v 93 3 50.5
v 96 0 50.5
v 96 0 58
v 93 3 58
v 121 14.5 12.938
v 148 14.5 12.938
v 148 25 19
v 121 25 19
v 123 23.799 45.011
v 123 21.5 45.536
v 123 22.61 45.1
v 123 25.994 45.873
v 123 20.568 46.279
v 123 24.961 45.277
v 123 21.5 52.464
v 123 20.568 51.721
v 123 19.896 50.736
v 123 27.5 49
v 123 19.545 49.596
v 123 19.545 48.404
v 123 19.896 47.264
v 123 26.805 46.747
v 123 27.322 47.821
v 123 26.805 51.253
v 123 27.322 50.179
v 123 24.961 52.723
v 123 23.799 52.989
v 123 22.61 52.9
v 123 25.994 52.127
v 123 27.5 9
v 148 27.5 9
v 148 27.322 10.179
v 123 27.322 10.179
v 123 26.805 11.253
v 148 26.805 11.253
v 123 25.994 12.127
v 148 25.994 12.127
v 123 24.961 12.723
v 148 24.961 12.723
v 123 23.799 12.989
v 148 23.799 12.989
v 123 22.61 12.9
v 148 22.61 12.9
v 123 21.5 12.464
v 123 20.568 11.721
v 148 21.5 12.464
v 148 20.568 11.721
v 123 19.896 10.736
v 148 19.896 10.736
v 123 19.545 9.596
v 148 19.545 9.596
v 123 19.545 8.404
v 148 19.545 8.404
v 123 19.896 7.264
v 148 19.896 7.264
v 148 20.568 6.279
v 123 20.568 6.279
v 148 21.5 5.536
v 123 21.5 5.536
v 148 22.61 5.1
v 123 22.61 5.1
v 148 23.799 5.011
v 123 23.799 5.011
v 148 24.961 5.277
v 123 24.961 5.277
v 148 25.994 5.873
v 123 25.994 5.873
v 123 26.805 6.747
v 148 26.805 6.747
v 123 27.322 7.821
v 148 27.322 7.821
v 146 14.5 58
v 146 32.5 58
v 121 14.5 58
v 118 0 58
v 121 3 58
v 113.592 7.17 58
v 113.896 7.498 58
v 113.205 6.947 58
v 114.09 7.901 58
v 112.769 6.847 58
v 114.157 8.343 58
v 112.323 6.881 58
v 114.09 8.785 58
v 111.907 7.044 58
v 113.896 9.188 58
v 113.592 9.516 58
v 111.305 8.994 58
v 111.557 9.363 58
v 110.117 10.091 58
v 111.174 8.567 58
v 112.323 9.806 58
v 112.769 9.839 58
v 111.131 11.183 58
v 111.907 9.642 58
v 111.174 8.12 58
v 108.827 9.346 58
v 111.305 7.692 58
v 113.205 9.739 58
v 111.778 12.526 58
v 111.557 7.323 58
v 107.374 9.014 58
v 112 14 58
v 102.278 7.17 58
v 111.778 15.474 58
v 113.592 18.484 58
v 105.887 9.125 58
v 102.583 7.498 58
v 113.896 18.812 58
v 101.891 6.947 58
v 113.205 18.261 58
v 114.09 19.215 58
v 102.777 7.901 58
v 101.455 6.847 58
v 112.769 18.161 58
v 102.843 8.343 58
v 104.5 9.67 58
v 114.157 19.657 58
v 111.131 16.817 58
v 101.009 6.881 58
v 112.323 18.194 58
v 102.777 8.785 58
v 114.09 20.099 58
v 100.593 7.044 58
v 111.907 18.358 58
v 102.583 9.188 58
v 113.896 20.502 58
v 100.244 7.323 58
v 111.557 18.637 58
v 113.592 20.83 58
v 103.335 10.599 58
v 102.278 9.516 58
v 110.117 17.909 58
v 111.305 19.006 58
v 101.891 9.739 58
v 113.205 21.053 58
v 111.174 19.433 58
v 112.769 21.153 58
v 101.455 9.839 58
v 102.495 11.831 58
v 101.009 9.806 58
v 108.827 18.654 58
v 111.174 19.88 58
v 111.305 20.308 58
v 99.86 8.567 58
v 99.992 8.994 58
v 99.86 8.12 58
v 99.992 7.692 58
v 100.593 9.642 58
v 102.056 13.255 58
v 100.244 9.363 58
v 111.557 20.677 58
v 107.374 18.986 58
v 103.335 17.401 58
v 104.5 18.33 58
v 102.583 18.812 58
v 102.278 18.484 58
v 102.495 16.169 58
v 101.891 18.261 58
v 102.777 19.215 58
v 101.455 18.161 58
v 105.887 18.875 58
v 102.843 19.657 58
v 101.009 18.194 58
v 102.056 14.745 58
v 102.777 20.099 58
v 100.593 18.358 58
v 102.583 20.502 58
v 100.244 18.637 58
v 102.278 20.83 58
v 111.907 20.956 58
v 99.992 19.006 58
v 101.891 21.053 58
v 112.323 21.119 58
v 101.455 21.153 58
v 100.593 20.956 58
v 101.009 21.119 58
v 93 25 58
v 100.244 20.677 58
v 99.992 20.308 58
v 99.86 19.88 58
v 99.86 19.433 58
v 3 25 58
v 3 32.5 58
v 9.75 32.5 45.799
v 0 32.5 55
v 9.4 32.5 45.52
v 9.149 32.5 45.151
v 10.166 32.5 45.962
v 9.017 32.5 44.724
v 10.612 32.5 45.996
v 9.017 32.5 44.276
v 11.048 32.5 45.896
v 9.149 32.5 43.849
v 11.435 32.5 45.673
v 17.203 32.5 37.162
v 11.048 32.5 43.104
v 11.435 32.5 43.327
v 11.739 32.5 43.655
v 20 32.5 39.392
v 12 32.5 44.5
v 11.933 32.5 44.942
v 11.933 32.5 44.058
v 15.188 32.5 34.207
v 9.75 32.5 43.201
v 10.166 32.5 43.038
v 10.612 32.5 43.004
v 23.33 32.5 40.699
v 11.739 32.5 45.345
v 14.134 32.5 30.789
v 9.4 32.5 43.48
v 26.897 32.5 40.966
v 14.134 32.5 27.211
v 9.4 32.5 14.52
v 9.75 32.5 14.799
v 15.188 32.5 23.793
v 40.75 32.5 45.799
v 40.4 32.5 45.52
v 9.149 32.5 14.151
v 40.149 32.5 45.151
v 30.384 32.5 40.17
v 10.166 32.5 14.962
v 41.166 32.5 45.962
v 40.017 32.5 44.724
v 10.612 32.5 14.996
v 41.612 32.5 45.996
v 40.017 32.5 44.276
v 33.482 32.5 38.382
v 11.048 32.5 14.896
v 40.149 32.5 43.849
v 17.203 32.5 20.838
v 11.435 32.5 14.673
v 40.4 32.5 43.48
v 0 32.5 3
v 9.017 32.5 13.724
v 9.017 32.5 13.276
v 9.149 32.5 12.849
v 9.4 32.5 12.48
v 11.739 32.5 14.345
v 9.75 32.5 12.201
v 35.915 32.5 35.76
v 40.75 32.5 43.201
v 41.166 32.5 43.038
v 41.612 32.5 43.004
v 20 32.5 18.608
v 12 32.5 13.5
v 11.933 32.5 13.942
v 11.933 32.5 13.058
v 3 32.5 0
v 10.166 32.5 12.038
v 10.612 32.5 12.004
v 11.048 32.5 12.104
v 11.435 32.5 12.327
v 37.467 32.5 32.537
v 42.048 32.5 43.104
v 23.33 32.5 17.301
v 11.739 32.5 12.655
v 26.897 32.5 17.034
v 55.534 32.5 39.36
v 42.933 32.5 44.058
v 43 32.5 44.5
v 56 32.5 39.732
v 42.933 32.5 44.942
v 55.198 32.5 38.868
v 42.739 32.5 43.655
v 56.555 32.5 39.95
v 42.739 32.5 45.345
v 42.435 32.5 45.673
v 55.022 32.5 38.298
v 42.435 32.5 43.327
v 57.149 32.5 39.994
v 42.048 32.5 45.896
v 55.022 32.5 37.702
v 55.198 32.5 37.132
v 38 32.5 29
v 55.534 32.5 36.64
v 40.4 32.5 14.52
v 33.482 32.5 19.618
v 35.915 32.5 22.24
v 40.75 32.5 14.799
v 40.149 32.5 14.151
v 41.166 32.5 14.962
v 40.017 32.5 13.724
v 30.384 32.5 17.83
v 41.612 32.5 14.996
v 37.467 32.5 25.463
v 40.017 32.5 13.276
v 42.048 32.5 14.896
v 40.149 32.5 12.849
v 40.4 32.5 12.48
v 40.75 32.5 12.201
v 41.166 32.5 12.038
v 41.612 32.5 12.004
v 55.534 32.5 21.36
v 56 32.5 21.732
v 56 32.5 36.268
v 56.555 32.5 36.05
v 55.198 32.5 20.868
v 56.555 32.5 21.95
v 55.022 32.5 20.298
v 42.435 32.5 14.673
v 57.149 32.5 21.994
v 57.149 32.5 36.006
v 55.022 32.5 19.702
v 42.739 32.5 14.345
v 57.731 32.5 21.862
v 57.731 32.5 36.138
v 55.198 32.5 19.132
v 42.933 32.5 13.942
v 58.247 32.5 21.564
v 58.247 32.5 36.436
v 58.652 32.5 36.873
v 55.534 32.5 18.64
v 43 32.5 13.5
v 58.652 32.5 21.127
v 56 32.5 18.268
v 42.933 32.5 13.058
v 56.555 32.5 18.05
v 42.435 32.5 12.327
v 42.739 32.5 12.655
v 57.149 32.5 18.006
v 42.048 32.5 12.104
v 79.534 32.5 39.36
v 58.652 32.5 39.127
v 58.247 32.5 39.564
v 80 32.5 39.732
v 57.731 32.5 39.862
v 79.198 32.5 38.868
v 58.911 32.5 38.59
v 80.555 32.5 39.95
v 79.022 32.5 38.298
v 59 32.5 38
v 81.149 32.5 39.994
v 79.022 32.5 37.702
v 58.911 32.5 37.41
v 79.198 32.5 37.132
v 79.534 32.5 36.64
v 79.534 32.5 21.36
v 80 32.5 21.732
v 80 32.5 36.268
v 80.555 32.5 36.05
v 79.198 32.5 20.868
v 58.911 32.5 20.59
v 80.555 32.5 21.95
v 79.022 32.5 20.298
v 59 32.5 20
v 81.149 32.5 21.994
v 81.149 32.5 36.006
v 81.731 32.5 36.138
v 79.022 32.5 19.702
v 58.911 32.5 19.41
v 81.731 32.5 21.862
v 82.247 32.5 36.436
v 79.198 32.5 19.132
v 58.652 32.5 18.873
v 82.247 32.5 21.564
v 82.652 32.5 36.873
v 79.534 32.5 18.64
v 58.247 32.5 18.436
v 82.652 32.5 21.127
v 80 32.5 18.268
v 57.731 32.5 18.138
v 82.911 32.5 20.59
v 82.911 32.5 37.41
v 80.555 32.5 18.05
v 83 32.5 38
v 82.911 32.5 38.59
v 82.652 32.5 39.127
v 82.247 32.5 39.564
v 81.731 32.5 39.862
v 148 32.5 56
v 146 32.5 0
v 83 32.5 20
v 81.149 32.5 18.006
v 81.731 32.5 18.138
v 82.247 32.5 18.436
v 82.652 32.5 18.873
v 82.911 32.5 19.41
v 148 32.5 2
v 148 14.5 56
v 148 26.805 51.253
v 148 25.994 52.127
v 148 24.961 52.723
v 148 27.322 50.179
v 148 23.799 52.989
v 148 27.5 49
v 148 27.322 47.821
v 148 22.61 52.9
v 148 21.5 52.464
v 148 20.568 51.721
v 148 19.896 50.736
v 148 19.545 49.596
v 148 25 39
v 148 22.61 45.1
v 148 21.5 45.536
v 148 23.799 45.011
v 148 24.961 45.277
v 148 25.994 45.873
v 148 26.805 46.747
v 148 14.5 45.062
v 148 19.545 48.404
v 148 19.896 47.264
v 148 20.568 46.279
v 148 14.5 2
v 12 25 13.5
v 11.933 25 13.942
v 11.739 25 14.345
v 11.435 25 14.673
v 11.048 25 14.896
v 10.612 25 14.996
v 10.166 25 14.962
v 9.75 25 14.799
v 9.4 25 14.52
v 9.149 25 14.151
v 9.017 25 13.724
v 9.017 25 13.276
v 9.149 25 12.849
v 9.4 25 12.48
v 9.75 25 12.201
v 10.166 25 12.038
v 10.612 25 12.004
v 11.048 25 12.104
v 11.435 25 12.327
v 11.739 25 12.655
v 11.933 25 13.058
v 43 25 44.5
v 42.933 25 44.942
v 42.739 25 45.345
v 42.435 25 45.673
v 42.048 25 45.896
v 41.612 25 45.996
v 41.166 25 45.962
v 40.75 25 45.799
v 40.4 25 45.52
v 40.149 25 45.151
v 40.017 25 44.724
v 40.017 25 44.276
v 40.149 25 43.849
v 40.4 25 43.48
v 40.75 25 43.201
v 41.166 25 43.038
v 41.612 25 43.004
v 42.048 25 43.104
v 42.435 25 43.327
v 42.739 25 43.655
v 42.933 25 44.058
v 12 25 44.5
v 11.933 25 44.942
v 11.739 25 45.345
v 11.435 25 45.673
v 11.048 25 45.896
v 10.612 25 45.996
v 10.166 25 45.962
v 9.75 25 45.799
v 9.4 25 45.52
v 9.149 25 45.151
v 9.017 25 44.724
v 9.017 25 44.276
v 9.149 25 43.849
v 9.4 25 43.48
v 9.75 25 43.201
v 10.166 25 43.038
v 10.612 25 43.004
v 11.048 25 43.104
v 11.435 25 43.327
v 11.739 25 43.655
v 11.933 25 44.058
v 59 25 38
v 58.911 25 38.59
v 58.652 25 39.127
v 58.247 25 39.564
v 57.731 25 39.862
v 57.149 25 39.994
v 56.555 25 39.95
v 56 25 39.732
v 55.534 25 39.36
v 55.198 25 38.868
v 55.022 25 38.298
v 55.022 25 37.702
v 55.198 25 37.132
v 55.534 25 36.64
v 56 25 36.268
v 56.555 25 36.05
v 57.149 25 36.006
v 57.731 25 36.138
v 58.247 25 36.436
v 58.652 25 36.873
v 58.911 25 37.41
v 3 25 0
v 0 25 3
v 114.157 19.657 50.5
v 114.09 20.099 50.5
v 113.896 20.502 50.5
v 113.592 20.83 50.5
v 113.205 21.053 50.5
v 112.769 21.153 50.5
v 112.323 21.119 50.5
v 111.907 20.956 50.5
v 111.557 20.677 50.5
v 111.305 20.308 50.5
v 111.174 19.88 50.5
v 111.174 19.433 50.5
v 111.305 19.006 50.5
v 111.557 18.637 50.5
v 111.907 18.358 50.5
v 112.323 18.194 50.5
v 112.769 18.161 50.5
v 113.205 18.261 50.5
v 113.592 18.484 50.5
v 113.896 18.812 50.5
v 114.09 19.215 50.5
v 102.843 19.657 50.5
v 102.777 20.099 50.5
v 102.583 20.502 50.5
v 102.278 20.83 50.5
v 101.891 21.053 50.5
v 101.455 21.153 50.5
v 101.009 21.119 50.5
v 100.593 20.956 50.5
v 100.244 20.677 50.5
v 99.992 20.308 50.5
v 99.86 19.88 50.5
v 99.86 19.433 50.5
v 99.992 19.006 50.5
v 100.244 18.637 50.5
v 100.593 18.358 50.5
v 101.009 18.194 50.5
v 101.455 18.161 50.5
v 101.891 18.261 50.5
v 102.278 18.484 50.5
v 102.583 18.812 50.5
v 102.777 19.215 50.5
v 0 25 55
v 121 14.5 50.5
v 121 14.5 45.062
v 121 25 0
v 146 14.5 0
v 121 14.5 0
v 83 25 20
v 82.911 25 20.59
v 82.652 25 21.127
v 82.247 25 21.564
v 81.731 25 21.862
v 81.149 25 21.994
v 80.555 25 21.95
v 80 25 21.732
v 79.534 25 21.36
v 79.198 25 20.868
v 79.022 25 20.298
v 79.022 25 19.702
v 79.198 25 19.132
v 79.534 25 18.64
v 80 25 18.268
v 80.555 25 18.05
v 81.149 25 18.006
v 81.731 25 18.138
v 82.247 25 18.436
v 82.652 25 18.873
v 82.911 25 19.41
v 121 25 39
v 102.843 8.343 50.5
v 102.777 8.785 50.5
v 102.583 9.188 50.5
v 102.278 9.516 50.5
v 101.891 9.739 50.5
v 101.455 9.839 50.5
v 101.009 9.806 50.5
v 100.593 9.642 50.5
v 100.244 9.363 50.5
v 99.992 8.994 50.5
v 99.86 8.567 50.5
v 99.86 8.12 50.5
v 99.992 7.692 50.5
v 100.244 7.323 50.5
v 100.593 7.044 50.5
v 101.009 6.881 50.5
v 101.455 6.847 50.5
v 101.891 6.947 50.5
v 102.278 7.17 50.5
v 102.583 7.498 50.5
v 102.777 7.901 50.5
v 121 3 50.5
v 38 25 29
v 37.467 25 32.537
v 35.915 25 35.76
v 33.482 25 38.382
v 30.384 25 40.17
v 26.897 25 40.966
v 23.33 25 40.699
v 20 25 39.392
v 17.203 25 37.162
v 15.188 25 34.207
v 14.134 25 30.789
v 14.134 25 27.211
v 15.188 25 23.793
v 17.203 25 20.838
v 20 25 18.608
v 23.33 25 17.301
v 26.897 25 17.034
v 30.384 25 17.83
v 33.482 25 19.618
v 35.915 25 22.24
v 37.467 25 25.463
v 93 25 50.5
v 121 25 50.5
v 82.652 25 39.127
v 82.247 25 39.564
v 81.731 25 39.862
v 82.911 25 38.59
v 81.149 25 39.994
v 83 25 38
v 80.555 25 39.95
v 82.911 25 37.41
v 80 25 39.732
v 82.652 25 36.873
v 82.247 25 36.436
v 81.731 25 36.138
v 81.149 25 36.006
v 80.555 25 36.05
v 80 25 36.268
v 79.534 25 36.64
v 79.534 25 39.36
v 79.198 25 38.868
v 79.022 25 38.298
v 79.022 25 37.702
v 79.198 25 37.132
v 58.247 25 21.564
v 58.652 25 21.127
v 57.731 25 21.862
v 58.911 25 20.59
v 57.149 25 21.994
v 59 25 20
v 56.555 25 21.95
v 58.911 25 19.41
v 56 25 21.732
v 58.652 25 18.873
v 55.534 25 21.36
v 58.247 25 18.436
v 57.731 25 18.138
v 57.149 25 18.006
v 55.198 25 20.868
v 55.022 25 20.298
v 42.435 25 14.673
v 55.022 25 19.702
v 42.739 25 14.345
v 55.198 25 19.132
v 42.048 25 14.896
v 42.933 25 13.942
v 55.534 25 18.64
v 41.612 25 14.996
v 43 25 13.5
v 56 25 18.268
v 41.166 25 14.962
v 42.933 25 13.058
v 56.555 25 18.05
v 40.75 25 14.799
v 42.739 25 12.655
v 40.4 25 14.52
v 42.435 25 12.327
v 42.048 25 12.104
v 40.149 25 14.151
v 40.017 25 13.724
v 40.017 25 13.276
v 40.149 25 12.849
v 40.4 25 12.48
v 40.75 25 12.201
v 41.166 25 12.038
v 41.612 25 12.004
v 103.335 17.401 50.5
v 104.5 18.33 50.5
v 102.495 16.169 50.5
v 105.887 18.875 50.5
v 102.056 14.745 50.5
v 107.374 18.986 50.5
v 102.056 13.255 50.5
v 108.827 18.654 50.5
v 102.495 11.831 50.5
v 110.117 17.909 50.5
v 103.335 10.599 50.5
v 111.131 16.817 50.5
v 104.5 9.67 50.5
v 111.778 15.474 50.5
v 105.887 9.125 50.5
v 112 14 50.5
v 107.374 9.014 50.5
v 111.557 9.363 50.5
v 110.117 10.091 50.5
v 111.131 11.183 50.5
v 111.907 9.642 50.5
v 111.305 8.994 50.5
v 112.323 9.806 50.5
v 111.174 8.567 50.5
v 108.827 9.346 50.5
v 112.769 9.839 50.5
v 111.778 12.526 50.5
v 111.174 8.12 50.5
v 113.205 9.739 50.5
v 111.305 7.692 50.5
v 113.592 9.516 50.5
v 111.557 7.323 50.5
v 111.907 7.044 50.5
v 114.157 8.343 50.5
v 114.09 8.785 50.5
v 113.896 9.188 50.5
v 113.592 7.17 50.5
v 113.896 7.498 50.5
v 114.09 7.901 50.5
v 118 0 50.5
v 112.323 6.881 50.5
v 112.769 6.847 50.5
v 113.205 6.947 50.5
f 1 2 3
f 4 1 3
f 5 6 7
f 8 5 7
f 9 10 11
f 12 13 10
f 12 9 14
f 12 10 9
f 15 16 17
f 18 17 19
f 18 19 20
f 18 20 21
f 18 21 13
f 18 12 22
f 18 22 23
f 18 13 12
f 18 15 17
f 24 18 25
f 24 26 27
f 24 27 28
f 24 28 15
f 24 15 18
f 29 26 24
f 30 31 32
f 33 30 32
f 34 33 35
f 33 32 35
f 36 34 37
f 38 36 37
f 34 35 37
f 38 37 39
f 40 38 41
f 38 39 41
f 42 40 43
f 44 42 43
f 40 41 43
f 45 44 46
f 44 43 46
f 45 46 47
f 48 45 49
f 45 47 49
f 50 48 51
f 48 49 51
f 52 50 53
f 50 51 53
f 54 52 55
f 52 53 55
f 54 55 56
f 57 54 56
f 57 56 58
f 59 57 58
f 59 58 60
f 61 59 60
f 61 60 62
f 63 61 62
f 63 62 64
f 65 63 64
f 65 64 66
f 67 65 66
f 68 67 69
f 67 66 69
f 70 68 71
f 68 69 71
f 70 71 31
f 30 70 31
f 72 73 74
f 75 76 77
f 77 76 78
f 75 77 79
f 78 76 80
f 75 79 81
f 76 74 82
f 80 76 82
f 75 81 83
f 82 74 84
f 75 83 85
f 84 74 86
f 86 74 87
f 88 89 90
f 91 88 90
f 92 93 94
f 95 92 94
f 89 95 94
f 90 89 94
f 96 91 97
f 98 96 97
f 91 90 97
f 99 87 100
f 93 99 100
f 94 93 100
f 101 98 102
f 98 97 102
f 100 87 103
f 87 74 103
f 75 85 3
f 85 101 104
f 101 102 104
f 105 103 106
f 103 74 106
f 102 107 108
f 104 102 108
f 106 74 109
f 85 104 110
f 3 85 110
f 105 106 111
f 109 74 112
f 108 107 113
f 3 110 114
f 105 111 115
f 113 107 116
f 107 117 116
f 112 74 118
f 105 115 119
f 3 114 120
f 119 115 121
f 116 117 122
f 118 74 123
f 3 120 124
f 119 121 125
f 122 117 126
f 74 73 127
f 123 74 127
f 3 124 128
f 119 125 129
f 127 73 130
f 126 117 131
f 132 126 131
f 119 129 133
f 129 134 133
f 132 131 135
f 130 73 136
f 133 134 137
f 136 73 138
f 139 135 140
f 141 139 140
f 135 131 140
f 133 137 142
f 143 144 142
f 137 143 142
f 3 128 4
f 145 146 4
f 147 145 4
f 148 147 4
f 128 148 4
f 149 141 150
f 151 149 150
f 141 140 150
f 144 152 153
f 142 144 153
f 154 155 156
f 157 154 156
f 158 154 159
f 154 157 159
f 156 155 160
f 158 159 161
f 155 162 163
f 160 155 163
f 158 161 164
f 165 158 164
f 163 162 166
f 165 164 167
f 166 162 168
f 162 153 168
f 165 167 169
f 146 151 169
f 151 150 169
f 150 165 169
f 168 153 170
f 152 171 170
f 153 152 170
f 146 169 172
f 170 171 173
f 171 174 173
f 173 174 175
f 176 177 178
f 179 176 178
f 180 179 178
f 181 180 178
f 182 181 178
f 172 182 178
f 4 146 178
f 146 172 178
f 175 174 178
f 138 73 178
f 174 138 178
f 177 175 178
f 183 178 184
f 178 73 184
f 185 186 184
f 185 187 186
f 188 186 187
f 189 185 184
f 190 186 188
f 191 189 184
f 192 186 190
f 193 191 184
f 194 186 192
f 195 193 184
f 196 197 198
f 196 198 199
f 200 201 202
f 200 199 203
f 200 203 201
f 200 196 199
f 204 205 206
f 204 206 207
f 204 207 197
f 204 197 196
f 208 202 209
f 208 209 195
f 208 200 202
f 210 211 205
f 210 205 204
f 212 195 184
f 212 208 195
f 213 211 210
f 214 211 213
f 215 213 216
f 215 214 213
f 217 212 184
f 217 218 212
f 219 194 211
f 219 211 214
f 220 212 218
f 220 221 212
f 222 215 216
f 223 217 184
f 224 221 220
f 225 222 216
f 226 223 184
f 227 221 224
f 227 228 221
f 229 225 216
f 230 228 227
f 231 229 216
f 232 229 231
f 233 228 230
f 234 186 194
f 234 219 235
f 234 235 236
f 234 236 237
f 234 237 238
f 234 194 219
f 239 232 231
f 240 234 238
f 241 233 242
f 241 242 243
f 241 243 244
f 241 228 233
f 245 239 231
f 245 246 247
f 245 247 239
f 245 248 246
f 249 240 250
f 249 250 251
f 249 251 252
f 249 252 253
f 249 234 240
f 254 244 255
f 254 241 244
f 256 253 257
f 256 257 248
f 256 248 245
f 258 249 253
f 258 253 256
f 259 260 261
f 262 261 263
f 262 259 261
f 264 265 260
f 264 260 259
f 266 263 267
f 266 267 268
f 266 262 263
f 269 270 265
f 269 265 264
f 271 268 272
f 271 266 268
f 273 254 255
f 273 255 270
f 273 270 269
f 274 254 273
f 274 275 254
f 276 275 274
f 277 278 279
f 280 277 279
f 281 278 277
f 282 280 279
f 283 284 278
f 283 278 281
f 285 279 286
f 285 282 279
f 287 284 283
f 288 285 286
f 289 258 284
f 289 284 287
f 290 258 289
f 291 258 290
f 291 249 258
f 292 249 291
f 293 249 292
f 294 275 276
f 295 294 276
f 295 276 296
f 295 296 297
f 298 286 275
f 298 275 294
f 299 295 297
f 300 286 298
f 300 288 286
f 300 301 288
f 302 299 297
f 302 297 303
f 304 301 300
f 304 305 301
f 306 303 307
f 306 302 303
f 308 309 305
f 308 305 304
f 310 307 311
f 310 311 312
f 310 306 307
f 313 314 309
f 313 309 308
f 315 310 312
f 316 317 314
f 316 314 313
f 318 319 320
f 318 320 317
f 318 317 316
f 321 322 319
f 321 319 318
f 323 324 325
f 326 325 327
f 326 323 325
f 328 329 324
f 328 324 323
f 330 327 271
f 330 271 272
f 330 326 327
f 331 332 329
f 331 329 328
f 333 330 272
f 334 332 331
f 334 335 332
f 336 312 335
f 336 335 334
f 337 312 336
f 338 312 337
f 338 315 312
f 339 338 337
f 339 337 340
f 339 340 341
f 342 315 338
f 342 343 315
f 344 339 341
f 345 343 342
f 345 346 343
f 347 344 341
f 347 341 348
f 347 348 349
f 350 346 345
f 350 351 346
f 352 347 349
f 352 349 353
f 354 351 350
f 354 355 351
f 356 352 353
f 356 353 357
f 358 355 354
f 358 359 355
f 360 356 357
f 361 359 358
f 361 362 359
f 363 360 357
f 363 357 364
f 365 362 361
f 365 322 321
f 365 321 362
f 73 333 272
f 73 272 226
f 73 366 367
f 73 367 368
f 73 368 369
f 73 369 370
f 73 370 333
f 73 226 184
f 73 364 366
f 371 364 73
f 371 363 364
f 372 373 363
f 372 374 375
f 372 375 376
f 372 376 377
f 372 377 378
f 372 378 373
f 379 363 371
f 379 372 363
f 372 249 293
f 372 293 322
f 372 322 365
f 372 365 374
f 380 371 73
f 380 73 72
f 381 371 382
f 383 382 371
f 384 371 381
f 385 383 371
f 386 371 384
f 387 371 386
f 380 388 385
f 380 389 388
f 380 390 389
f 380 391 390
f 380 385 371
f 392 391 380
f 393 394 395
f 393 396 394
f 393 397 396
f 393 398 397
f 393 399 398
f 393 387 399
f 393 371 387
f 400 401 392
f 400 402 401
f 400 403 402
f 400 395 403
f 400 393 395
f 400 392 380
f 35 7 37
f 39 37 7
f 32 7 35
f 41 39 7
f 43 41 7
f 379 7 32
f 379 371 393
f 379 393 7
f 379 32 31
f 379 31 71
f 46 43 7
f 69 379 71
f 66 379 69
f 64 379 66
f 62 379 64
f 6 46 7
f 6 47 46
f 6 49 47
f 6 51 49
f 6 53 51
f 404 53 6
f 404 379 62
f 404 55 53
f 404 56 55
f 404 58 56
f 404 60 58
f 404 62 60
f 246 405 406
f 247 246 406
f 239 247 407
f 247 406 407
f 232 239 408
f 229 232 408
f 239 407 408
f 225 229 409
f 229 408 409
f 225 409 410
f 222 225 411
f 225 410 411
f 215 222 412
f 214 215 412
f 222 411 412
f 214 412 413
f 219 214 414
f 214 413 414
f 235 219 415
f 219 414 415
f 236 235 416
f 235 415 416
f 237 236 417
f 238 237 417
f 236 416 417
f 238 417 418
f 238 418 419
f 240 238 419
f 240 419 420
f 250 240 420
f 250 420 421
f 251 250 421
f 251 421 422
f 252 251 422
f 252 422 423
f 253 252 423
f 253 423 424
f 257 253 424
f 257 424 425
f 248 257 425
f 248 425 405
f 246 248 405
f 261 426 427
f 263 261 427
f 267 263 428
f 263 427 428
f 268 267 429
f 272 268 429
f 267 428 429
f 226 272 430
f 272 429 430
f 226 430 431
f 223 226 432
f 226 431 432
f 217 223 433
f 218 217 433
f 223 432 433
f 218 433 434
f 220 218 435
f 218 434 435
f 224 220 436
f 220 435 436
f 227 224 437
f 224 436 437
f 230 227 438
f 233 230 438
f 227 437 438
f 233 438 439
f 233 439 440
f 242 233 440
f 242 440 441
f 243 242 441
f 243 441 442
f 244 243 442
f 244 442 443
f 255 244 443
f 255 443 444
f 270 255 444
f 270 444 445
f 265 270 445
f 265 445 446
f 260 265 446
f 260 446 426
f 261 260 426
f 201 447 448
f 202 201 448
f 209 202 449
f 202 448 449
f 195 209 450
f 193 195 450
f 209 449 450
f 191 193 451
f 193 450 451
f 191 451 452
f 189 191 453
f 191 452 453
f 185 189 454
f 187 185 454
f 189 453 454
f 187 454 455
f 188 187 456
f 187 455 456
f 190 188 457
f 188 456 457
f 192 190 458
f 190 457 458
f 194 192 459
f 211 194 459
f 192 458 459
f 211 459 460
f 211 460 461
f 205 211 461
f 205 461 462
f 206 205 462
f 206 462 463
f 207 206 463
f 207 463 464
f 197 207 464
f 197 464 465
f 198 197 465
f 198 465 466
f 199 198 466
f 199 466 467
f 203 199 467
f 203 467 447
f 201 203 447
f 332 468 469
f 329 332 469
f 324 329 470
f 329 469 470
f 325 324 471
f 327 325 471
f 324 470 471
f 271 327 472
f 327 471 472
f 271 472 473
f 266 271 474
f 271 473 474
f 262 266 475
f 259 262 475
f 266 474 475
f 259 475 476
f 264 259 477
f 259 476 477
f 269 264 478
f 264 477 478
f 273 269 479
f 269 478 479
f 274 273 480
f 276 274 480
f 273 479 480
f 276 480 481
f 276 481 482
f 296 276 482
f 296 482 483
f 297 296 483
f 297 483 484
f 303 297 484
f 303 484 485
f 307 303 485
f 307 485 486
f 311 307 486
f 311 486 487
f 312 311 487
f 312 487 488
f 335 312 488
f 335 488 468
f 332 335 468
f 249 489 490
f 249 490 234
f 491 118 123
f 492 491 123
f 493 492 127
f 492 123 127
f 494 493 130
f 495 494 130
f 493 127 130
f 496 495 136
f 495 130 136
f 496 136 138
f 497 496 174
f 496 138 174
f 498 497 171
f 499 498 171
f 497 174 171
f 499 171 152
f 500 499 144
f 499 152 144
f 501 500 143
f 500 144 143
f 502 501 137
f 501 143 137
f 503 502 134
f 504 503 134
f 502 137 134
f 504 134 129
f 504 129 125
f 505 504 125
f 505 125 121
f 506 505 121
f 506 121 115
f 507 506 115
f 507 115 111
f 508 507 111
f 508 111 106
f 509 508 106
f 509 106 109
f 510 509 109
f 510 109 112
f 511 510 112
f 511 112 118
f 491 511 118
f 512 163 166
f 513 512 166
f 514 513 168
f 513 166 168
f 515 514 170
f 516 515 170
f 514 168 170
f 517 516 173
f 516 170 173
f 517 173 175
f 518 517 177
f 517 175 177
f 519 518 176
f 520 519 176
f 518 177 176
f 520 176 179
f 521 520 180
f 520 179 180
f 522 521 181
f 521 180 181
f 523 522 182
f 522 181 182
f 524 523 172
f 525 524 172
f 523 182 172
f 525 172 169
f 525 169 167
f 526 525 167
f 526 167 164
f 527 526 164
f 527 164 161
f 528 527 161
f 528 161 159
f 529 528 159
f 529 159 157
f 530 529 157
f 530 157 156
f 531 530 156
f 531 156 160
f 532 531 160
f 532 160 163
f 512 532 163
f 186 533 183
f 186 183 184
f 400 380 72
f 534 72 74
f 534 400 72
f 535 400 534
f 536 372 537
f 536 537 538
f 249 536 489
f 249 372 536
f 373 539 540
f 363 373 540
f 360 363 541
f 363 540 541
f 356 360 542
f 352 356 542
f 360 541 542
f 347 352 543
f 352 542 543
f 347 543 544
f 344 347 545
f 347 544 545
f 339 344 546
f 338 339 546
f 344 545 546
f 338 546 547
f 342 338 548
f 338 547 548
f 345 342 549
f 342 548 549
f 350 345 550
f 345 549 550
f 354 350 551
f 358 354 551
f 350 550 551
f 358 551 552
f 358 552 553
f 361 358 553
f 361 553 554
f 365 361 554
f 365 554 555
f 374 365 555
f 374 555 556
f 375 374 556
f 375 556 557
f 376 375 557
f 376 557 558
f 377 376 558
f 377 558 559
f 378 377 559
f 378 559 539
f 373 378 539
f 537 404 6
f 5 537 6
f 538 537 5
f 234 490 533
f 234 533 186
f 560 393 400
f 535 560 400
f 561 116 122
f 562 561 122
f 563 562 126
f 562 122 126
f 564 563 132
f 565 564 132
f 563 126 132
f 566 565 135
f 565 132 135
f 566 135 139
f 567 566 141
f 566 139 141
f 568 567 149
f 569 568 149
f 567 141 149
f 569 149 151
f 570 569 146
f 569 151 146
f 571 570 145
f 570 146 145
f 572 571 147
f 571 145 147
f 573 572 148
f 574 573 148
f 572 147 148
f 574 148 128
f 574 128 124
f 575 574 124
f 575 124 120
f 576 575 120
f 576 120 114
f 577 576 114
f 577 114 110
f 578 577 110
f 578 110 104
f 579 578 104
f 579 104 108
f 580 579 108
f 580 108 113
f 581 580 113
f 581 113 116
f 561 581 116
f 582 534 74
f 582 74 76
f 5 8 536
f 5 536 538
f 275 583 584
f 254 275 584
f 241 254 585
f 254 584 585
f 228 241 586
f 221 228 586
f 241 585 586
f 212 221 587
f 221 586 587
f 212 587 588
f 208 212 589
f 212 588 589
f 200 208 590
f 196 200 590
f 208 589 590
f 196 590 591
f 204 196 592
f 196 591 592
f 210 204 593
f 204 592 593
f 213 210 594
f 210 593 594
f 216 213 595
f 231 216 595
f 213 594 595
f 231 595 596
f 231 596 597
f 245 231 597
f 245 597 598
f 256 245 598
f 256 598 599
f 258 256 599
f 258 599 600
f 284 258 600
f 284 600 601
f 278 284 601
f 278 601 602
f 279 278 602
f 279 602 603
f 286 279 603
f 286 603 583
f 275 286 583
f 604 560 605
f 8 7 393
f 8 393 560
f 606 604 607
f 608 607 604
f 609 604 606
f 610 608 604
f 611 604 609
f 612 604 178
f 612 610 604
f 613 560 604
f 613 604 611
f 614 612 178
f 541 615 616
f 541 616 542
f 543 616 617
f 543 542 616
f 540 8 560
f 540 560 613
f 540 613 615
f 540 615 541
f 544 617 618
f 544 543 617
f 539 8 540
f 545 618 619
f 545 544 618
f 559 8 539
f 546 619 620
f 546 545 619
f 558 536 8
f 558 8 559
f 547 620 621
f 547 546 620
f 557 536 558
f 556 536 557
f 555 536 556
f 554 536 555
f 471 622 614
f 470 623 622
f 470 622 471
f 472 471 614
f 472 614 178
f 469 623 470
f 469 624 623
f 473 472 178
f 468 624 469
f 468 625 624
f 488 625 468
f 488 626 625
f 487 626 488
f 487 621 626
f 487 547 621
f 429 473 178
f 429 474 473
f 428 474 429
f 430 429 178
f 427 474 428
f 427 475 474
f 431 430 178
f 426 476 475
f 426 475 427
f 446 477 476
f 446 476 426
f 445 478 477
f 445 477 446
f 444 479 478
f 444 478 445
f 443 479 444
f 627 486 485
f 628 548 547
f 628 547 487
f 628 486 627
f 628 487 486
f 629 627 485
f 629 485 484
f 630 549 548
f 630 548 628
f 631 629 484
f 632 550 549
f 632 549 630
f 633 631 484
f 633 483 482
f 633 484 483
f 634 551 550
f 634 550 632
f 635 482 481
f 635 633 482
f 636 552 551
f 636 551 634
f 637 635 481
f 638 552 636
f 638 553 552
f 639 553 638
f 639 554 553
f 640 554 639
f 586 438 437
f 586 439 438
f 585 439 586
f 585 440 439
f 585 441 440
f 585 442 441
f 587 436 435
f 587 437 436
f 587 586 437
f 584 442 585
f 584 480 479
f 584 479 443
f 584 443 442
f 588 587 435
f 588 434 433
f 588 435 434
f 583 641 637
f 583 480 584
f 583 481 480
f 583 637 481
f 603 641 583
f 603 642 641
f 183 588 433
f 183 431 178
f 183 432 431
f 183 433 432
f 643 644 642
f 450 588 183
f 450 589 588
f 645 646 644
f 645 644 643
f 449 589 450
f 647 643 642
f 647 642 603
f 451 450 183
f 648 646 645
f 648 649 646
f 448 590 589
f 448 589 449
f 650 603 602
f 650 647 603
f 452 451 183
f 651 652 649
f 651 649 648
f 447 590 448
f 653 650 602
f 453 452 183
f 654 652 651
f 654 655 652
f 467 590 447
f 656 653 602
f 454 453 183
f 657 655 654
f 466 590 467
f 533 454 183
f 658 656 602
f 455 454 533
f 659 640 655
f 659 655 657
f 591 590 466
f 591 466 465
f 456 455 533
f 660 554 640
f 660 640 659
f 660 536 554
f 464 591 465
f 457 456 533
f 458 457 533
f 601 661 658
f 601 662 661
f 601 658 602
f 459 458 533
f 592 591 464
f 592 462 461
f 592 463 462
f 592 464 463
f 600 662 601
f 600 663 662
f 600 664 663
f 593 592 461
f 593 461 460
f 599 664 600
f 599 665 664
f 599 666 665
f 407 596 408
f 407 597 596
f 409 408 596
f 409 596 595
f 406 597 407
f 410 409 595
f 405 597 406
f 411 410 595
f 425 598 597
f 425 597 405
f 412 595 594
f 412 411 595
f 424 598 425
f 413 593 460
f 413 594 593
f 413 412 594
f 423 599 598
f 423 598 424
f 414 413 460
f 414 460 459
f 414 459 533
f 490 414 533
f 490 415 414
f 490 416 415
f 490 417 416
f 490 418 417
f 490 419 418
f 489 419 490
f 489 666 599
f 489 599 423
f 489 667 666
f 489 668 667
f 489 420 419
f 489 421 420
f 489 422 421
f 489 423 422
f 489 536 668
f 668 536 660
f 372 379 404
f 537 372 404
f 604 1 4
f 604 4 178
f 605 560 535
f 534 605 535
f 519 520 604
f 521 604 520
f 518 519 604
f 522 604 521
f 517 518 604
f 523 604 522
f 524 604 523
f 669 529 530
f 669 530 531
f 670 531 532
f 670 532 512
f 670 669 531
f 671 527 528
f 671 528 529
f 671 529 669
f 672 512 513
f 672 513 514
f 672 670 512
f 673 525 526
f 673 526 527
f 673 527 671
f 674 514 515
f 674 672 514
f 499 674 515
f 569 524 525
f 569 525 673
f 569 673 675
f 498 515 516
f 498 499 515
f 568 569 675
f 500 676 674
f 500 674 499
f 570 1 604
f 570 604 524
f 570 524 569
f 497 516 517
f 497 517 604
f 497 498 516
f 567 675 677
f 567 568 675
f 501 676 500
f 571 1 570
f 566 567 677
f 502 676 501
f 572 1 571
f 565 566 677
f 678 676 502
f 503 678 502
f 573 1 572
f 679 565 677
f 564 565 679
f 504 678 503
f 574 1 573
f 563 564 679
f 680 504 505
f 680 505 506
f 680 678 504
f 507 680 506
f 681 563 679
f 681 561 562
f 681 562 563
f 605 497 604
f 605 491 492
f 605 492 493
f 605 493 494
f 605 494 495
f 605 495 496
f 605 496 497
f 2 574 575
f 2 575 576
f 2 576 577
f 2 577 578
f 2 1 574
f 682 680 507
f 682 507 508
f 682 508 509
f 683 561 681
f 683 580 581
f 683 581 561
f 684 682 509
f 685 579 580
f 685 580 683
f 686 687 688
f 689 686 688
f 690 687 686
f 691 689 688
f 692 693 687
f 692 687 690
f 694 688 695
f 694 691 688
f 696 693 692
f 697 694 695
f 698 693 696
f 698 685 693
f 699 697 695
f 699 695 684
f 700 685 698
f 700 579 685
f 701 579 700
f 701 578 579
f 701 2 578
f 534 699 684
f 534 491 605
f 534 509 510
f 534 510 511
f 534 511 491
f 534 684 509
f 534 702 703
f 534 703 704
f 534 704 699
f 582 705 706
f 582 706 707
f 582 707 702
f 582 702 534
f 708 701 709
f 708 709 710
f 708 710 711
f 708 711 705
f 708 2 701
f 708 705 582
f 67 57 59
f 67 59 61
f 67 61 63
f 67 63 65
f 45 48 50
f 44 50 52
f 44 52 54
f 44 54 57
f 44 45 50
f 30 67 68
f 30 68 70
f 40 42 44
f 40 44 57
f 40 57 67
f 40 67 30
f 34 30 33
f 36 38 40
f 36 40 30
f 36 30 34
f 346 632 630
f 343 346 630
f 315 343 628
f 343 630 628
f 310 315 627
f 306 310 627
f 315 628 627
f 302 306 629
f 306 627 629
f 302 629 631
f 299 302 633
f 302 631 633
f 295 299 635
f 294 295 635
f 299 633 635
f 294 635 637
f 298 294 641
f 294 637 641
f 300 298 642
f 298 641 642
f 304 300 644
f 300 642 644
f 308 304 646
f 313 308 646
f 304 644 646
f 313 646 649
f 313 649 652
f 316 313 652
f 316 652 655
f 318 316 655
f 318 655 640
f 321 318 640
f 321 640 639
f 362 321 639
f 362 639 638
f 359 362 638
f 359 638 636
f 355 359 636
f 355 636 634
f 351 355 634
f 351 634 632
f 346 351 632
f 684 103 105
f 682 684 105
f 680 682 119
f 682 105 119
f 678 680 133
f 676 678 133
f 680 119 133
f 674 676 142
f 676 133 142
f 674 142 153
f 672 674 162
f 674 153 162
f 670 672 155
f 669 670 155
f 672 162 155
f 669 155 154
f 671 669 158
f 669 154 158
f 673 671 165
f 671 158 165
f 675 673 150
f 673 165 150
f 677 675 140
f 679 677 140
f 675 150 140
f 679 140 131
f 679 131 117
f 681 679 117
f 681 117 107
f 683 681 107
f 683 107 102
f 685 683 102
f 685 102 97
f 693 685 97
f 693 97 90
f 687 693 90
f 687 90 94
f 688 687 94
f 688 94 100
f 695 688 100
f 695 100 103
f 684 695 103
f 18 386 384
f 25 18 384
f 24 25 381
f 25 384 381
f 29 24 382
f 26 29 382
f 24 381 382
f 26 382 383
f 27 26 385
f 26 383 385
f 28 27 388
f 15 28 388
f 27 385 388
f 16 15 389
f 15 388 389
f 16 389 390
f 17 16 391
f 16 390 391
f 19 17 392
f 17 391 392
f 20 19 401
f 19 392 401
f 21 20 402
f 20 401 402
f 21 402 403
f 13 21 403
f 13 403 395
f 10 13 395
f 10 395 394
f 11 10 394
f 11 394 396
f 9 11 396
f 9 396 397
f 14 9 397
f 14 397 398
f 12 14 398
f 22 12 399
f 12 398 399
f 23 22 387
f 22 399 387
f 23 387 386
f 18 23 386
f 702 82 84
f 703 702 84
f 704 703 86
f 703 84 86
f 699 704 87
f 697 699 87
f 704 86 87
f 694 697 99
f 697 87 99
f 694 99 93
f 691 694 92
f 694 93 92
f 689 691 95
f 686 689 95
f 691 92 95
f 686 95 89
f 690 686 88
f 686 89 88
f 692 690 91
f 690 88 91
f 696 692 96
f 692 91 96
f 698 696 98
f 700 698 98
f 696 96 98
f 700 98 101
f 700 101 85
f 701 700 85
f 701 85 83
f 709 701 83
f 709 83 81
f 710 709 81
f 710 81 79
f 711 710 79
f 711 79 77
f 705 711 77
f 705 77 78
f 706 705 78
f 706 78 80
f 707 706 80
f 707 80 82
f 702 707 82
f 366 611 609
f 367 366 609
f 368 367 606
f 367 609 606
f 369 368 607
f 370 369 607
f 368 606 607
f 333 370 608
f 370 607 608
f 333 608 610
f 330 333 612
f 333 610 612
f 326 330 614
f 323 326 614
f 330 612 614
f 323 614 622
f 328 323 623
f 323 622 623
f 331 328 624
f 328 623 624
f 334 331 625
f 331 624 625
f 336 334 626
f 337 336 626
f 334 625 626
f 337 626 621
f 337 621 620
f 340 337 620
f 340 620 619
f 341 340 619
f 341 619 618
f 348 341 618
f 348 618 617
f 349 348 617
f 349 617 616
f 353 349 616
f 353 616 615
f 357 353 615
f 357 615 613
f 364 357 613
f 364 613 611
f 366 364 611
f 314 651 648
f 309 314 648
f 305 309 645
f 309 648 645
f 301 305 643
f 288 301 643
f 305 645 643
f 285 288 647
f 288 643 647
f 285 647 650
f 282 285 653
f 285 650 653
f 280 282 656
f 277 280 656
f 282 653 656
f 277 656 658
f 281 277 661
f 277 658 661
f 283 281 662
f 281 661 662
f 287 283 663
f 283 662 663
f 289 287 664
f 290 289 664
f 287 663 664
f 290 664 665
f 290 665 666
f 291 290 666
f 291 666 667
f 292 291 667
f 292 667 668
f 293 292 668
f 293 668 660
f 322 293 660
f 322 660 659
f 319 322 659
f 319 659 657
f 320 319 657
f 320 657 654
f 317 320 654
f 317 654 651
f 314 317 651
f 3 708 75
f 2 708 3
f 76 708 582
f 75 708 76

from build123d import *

# Parameters (mm, degrees)
PAD_DEPTH       = 58
SKETCH001_R     = 4
POCKET_DEPTH    = 25
SKETCH002_W     = 28
SKETCH002_H     = 25
POCKET001_DEPTH = 50.5
POCKET002_DEPTH = 27
SKETCH004_R     = 5
SKETCH004_R_2   = 1.5
POCKET003_DEPTH = 58.001
SKETCH005_R     = 12
SKETCH005_R_2   = 1.5
SKETCH005_R_3   = 2
POCKET004_DEPTH = 7.501
CHAMFER_SIZE    = 2
CHAMFER001_SIZE = 3
CHAMFER002_SIZE = 3


with BuildPart() as part:
    # Sketch → Pad (new body)
    with BuildSketch(Plane.XY):
        Polygon((0, 25), (0, 32.5), (148, 32.5), (148, 14.5), (121, 14.5), (121, 0), (93, 0), (93, 25), align=None)
    extrude(amount=PAD_DEPTH)

    # Sketch001 (on Face3 of Pad) → Pocket (cut)
    with BuildSketch(Plane.YZ.offset(148)):
        with Locations((23.5, 49)):
            Circle(SKETCH001_R)
        with Locations((23.5, 9)):
            Circle(SKETCH001_R)
    extrude(amount=-POCKET_DEPTH, mode=Mode.SUBTRACT)

    # Sketch002 (on Face4 of Pocket) → Pocket001 (cut)
    with BuildSketch(Plane(origin=(0, 0, 0), x_dir=(1, 0, 0), z_dir=(0, 0, -1))):
        with Locations((107, -12.5)):
            Rectangle(SKETCH002_W, SKETCH002_H)
    extrude(amount=-POCKET001_DEPTH, mode=Mode.SUBTRACT)

    # Sketch003 (on Face8 of Pocket001) → Pocket002 (cut)
    with BuildSketch(Plane.YZ.offset(148)):
        Polygon((14.5, 45.062178), (14.5, 12.937822), (25, 19), (25, 39), align=None)
    extrude(amount=-POCKET002_DEPTH, mode=Mode.SUBTRACT)

    # Sketch004 (on Face4 of Pocket002) → Pocket003 (cut, through all)
    with BuildSketch(Plane.XY.offset(58)):
        with Locations((107, 14)):
            Circle(SKETCH004_R)
        with Locations((101.343146, 19.656854)):
            Circle(SKETCH004_R_2)
        with Locations((112.656854, 19.656854)):
            Circle(SKETCH004_R_2)
        with Locations((112.656854, 8.343146)):
            Circle(SKETCH004_R_2)
        with Locations((101.343146, 8.343146)):
            Circle(SKETCH004_R_2)
    extrude(amount=-POCKET003_DEPTH, mode=Mode.SUBTRACT)

    # Sketch005 (on Face2 of Pocket003) → Pocket004 (cut, through all)
    with BuildSketch(Plane.XZ.offset(-25)):
        with Locations((26, 29)):
            Circle(SKETCH005_R)
        with Locations((10.5, 44.5)):
            Circle(SKETCH005_R_2)
        with Locations((41.5, 44.5)):
            Circle(SKETCH005_R_2)
        with Locations((10.5, 13.5)):
            Circle(SKETCH005_R_2)
        with Locations((41.5, 13.5)):
            Circle(SKETCH005_R_2)
        with Locations((57, 38)):
            Circle(SKETCH005_R_3)
        with Locations((81, 38)):
            Circle(SKETCH005_R_3)
        with Locations((81, 20)):
            Circle(SKETCH005_R_3)
        with Locations((57, 20)):
            Circle(SKETCH005_R_3)
    extrude(amount=-POCKET004_DEPTH, mode=Mode.SUBTRACT)

    # Chamfer
    chamfer_edges = [part.edges().sort_by_distance(p)[0] for p in [
        (148, 23.5, 58),
        (148, 23.5, 0),
    ]]
    chamfer(chamfer_edges, length=CHAMFER_SIZE)

    # Chamfer001
    chamfer001_edges = [part.edges().sort_by_distance(p)[0] for p in [
        (121, 0, 54.25),
        (93, 0, 54.25),
    ]]
    chamfer(chamfer001_edges, length=CHAMFER001_SIZE)

    # Chamfer002
    chamfer002_edges = [part.edges().sort_by_distance(p)[0] for p in [
        (0, 28.75, 58),
        (0, 28.75, 0),
    ]]
    chamfer(chamfer002_edges, length=CHAMFER002_SIZE)


solid = part.part
